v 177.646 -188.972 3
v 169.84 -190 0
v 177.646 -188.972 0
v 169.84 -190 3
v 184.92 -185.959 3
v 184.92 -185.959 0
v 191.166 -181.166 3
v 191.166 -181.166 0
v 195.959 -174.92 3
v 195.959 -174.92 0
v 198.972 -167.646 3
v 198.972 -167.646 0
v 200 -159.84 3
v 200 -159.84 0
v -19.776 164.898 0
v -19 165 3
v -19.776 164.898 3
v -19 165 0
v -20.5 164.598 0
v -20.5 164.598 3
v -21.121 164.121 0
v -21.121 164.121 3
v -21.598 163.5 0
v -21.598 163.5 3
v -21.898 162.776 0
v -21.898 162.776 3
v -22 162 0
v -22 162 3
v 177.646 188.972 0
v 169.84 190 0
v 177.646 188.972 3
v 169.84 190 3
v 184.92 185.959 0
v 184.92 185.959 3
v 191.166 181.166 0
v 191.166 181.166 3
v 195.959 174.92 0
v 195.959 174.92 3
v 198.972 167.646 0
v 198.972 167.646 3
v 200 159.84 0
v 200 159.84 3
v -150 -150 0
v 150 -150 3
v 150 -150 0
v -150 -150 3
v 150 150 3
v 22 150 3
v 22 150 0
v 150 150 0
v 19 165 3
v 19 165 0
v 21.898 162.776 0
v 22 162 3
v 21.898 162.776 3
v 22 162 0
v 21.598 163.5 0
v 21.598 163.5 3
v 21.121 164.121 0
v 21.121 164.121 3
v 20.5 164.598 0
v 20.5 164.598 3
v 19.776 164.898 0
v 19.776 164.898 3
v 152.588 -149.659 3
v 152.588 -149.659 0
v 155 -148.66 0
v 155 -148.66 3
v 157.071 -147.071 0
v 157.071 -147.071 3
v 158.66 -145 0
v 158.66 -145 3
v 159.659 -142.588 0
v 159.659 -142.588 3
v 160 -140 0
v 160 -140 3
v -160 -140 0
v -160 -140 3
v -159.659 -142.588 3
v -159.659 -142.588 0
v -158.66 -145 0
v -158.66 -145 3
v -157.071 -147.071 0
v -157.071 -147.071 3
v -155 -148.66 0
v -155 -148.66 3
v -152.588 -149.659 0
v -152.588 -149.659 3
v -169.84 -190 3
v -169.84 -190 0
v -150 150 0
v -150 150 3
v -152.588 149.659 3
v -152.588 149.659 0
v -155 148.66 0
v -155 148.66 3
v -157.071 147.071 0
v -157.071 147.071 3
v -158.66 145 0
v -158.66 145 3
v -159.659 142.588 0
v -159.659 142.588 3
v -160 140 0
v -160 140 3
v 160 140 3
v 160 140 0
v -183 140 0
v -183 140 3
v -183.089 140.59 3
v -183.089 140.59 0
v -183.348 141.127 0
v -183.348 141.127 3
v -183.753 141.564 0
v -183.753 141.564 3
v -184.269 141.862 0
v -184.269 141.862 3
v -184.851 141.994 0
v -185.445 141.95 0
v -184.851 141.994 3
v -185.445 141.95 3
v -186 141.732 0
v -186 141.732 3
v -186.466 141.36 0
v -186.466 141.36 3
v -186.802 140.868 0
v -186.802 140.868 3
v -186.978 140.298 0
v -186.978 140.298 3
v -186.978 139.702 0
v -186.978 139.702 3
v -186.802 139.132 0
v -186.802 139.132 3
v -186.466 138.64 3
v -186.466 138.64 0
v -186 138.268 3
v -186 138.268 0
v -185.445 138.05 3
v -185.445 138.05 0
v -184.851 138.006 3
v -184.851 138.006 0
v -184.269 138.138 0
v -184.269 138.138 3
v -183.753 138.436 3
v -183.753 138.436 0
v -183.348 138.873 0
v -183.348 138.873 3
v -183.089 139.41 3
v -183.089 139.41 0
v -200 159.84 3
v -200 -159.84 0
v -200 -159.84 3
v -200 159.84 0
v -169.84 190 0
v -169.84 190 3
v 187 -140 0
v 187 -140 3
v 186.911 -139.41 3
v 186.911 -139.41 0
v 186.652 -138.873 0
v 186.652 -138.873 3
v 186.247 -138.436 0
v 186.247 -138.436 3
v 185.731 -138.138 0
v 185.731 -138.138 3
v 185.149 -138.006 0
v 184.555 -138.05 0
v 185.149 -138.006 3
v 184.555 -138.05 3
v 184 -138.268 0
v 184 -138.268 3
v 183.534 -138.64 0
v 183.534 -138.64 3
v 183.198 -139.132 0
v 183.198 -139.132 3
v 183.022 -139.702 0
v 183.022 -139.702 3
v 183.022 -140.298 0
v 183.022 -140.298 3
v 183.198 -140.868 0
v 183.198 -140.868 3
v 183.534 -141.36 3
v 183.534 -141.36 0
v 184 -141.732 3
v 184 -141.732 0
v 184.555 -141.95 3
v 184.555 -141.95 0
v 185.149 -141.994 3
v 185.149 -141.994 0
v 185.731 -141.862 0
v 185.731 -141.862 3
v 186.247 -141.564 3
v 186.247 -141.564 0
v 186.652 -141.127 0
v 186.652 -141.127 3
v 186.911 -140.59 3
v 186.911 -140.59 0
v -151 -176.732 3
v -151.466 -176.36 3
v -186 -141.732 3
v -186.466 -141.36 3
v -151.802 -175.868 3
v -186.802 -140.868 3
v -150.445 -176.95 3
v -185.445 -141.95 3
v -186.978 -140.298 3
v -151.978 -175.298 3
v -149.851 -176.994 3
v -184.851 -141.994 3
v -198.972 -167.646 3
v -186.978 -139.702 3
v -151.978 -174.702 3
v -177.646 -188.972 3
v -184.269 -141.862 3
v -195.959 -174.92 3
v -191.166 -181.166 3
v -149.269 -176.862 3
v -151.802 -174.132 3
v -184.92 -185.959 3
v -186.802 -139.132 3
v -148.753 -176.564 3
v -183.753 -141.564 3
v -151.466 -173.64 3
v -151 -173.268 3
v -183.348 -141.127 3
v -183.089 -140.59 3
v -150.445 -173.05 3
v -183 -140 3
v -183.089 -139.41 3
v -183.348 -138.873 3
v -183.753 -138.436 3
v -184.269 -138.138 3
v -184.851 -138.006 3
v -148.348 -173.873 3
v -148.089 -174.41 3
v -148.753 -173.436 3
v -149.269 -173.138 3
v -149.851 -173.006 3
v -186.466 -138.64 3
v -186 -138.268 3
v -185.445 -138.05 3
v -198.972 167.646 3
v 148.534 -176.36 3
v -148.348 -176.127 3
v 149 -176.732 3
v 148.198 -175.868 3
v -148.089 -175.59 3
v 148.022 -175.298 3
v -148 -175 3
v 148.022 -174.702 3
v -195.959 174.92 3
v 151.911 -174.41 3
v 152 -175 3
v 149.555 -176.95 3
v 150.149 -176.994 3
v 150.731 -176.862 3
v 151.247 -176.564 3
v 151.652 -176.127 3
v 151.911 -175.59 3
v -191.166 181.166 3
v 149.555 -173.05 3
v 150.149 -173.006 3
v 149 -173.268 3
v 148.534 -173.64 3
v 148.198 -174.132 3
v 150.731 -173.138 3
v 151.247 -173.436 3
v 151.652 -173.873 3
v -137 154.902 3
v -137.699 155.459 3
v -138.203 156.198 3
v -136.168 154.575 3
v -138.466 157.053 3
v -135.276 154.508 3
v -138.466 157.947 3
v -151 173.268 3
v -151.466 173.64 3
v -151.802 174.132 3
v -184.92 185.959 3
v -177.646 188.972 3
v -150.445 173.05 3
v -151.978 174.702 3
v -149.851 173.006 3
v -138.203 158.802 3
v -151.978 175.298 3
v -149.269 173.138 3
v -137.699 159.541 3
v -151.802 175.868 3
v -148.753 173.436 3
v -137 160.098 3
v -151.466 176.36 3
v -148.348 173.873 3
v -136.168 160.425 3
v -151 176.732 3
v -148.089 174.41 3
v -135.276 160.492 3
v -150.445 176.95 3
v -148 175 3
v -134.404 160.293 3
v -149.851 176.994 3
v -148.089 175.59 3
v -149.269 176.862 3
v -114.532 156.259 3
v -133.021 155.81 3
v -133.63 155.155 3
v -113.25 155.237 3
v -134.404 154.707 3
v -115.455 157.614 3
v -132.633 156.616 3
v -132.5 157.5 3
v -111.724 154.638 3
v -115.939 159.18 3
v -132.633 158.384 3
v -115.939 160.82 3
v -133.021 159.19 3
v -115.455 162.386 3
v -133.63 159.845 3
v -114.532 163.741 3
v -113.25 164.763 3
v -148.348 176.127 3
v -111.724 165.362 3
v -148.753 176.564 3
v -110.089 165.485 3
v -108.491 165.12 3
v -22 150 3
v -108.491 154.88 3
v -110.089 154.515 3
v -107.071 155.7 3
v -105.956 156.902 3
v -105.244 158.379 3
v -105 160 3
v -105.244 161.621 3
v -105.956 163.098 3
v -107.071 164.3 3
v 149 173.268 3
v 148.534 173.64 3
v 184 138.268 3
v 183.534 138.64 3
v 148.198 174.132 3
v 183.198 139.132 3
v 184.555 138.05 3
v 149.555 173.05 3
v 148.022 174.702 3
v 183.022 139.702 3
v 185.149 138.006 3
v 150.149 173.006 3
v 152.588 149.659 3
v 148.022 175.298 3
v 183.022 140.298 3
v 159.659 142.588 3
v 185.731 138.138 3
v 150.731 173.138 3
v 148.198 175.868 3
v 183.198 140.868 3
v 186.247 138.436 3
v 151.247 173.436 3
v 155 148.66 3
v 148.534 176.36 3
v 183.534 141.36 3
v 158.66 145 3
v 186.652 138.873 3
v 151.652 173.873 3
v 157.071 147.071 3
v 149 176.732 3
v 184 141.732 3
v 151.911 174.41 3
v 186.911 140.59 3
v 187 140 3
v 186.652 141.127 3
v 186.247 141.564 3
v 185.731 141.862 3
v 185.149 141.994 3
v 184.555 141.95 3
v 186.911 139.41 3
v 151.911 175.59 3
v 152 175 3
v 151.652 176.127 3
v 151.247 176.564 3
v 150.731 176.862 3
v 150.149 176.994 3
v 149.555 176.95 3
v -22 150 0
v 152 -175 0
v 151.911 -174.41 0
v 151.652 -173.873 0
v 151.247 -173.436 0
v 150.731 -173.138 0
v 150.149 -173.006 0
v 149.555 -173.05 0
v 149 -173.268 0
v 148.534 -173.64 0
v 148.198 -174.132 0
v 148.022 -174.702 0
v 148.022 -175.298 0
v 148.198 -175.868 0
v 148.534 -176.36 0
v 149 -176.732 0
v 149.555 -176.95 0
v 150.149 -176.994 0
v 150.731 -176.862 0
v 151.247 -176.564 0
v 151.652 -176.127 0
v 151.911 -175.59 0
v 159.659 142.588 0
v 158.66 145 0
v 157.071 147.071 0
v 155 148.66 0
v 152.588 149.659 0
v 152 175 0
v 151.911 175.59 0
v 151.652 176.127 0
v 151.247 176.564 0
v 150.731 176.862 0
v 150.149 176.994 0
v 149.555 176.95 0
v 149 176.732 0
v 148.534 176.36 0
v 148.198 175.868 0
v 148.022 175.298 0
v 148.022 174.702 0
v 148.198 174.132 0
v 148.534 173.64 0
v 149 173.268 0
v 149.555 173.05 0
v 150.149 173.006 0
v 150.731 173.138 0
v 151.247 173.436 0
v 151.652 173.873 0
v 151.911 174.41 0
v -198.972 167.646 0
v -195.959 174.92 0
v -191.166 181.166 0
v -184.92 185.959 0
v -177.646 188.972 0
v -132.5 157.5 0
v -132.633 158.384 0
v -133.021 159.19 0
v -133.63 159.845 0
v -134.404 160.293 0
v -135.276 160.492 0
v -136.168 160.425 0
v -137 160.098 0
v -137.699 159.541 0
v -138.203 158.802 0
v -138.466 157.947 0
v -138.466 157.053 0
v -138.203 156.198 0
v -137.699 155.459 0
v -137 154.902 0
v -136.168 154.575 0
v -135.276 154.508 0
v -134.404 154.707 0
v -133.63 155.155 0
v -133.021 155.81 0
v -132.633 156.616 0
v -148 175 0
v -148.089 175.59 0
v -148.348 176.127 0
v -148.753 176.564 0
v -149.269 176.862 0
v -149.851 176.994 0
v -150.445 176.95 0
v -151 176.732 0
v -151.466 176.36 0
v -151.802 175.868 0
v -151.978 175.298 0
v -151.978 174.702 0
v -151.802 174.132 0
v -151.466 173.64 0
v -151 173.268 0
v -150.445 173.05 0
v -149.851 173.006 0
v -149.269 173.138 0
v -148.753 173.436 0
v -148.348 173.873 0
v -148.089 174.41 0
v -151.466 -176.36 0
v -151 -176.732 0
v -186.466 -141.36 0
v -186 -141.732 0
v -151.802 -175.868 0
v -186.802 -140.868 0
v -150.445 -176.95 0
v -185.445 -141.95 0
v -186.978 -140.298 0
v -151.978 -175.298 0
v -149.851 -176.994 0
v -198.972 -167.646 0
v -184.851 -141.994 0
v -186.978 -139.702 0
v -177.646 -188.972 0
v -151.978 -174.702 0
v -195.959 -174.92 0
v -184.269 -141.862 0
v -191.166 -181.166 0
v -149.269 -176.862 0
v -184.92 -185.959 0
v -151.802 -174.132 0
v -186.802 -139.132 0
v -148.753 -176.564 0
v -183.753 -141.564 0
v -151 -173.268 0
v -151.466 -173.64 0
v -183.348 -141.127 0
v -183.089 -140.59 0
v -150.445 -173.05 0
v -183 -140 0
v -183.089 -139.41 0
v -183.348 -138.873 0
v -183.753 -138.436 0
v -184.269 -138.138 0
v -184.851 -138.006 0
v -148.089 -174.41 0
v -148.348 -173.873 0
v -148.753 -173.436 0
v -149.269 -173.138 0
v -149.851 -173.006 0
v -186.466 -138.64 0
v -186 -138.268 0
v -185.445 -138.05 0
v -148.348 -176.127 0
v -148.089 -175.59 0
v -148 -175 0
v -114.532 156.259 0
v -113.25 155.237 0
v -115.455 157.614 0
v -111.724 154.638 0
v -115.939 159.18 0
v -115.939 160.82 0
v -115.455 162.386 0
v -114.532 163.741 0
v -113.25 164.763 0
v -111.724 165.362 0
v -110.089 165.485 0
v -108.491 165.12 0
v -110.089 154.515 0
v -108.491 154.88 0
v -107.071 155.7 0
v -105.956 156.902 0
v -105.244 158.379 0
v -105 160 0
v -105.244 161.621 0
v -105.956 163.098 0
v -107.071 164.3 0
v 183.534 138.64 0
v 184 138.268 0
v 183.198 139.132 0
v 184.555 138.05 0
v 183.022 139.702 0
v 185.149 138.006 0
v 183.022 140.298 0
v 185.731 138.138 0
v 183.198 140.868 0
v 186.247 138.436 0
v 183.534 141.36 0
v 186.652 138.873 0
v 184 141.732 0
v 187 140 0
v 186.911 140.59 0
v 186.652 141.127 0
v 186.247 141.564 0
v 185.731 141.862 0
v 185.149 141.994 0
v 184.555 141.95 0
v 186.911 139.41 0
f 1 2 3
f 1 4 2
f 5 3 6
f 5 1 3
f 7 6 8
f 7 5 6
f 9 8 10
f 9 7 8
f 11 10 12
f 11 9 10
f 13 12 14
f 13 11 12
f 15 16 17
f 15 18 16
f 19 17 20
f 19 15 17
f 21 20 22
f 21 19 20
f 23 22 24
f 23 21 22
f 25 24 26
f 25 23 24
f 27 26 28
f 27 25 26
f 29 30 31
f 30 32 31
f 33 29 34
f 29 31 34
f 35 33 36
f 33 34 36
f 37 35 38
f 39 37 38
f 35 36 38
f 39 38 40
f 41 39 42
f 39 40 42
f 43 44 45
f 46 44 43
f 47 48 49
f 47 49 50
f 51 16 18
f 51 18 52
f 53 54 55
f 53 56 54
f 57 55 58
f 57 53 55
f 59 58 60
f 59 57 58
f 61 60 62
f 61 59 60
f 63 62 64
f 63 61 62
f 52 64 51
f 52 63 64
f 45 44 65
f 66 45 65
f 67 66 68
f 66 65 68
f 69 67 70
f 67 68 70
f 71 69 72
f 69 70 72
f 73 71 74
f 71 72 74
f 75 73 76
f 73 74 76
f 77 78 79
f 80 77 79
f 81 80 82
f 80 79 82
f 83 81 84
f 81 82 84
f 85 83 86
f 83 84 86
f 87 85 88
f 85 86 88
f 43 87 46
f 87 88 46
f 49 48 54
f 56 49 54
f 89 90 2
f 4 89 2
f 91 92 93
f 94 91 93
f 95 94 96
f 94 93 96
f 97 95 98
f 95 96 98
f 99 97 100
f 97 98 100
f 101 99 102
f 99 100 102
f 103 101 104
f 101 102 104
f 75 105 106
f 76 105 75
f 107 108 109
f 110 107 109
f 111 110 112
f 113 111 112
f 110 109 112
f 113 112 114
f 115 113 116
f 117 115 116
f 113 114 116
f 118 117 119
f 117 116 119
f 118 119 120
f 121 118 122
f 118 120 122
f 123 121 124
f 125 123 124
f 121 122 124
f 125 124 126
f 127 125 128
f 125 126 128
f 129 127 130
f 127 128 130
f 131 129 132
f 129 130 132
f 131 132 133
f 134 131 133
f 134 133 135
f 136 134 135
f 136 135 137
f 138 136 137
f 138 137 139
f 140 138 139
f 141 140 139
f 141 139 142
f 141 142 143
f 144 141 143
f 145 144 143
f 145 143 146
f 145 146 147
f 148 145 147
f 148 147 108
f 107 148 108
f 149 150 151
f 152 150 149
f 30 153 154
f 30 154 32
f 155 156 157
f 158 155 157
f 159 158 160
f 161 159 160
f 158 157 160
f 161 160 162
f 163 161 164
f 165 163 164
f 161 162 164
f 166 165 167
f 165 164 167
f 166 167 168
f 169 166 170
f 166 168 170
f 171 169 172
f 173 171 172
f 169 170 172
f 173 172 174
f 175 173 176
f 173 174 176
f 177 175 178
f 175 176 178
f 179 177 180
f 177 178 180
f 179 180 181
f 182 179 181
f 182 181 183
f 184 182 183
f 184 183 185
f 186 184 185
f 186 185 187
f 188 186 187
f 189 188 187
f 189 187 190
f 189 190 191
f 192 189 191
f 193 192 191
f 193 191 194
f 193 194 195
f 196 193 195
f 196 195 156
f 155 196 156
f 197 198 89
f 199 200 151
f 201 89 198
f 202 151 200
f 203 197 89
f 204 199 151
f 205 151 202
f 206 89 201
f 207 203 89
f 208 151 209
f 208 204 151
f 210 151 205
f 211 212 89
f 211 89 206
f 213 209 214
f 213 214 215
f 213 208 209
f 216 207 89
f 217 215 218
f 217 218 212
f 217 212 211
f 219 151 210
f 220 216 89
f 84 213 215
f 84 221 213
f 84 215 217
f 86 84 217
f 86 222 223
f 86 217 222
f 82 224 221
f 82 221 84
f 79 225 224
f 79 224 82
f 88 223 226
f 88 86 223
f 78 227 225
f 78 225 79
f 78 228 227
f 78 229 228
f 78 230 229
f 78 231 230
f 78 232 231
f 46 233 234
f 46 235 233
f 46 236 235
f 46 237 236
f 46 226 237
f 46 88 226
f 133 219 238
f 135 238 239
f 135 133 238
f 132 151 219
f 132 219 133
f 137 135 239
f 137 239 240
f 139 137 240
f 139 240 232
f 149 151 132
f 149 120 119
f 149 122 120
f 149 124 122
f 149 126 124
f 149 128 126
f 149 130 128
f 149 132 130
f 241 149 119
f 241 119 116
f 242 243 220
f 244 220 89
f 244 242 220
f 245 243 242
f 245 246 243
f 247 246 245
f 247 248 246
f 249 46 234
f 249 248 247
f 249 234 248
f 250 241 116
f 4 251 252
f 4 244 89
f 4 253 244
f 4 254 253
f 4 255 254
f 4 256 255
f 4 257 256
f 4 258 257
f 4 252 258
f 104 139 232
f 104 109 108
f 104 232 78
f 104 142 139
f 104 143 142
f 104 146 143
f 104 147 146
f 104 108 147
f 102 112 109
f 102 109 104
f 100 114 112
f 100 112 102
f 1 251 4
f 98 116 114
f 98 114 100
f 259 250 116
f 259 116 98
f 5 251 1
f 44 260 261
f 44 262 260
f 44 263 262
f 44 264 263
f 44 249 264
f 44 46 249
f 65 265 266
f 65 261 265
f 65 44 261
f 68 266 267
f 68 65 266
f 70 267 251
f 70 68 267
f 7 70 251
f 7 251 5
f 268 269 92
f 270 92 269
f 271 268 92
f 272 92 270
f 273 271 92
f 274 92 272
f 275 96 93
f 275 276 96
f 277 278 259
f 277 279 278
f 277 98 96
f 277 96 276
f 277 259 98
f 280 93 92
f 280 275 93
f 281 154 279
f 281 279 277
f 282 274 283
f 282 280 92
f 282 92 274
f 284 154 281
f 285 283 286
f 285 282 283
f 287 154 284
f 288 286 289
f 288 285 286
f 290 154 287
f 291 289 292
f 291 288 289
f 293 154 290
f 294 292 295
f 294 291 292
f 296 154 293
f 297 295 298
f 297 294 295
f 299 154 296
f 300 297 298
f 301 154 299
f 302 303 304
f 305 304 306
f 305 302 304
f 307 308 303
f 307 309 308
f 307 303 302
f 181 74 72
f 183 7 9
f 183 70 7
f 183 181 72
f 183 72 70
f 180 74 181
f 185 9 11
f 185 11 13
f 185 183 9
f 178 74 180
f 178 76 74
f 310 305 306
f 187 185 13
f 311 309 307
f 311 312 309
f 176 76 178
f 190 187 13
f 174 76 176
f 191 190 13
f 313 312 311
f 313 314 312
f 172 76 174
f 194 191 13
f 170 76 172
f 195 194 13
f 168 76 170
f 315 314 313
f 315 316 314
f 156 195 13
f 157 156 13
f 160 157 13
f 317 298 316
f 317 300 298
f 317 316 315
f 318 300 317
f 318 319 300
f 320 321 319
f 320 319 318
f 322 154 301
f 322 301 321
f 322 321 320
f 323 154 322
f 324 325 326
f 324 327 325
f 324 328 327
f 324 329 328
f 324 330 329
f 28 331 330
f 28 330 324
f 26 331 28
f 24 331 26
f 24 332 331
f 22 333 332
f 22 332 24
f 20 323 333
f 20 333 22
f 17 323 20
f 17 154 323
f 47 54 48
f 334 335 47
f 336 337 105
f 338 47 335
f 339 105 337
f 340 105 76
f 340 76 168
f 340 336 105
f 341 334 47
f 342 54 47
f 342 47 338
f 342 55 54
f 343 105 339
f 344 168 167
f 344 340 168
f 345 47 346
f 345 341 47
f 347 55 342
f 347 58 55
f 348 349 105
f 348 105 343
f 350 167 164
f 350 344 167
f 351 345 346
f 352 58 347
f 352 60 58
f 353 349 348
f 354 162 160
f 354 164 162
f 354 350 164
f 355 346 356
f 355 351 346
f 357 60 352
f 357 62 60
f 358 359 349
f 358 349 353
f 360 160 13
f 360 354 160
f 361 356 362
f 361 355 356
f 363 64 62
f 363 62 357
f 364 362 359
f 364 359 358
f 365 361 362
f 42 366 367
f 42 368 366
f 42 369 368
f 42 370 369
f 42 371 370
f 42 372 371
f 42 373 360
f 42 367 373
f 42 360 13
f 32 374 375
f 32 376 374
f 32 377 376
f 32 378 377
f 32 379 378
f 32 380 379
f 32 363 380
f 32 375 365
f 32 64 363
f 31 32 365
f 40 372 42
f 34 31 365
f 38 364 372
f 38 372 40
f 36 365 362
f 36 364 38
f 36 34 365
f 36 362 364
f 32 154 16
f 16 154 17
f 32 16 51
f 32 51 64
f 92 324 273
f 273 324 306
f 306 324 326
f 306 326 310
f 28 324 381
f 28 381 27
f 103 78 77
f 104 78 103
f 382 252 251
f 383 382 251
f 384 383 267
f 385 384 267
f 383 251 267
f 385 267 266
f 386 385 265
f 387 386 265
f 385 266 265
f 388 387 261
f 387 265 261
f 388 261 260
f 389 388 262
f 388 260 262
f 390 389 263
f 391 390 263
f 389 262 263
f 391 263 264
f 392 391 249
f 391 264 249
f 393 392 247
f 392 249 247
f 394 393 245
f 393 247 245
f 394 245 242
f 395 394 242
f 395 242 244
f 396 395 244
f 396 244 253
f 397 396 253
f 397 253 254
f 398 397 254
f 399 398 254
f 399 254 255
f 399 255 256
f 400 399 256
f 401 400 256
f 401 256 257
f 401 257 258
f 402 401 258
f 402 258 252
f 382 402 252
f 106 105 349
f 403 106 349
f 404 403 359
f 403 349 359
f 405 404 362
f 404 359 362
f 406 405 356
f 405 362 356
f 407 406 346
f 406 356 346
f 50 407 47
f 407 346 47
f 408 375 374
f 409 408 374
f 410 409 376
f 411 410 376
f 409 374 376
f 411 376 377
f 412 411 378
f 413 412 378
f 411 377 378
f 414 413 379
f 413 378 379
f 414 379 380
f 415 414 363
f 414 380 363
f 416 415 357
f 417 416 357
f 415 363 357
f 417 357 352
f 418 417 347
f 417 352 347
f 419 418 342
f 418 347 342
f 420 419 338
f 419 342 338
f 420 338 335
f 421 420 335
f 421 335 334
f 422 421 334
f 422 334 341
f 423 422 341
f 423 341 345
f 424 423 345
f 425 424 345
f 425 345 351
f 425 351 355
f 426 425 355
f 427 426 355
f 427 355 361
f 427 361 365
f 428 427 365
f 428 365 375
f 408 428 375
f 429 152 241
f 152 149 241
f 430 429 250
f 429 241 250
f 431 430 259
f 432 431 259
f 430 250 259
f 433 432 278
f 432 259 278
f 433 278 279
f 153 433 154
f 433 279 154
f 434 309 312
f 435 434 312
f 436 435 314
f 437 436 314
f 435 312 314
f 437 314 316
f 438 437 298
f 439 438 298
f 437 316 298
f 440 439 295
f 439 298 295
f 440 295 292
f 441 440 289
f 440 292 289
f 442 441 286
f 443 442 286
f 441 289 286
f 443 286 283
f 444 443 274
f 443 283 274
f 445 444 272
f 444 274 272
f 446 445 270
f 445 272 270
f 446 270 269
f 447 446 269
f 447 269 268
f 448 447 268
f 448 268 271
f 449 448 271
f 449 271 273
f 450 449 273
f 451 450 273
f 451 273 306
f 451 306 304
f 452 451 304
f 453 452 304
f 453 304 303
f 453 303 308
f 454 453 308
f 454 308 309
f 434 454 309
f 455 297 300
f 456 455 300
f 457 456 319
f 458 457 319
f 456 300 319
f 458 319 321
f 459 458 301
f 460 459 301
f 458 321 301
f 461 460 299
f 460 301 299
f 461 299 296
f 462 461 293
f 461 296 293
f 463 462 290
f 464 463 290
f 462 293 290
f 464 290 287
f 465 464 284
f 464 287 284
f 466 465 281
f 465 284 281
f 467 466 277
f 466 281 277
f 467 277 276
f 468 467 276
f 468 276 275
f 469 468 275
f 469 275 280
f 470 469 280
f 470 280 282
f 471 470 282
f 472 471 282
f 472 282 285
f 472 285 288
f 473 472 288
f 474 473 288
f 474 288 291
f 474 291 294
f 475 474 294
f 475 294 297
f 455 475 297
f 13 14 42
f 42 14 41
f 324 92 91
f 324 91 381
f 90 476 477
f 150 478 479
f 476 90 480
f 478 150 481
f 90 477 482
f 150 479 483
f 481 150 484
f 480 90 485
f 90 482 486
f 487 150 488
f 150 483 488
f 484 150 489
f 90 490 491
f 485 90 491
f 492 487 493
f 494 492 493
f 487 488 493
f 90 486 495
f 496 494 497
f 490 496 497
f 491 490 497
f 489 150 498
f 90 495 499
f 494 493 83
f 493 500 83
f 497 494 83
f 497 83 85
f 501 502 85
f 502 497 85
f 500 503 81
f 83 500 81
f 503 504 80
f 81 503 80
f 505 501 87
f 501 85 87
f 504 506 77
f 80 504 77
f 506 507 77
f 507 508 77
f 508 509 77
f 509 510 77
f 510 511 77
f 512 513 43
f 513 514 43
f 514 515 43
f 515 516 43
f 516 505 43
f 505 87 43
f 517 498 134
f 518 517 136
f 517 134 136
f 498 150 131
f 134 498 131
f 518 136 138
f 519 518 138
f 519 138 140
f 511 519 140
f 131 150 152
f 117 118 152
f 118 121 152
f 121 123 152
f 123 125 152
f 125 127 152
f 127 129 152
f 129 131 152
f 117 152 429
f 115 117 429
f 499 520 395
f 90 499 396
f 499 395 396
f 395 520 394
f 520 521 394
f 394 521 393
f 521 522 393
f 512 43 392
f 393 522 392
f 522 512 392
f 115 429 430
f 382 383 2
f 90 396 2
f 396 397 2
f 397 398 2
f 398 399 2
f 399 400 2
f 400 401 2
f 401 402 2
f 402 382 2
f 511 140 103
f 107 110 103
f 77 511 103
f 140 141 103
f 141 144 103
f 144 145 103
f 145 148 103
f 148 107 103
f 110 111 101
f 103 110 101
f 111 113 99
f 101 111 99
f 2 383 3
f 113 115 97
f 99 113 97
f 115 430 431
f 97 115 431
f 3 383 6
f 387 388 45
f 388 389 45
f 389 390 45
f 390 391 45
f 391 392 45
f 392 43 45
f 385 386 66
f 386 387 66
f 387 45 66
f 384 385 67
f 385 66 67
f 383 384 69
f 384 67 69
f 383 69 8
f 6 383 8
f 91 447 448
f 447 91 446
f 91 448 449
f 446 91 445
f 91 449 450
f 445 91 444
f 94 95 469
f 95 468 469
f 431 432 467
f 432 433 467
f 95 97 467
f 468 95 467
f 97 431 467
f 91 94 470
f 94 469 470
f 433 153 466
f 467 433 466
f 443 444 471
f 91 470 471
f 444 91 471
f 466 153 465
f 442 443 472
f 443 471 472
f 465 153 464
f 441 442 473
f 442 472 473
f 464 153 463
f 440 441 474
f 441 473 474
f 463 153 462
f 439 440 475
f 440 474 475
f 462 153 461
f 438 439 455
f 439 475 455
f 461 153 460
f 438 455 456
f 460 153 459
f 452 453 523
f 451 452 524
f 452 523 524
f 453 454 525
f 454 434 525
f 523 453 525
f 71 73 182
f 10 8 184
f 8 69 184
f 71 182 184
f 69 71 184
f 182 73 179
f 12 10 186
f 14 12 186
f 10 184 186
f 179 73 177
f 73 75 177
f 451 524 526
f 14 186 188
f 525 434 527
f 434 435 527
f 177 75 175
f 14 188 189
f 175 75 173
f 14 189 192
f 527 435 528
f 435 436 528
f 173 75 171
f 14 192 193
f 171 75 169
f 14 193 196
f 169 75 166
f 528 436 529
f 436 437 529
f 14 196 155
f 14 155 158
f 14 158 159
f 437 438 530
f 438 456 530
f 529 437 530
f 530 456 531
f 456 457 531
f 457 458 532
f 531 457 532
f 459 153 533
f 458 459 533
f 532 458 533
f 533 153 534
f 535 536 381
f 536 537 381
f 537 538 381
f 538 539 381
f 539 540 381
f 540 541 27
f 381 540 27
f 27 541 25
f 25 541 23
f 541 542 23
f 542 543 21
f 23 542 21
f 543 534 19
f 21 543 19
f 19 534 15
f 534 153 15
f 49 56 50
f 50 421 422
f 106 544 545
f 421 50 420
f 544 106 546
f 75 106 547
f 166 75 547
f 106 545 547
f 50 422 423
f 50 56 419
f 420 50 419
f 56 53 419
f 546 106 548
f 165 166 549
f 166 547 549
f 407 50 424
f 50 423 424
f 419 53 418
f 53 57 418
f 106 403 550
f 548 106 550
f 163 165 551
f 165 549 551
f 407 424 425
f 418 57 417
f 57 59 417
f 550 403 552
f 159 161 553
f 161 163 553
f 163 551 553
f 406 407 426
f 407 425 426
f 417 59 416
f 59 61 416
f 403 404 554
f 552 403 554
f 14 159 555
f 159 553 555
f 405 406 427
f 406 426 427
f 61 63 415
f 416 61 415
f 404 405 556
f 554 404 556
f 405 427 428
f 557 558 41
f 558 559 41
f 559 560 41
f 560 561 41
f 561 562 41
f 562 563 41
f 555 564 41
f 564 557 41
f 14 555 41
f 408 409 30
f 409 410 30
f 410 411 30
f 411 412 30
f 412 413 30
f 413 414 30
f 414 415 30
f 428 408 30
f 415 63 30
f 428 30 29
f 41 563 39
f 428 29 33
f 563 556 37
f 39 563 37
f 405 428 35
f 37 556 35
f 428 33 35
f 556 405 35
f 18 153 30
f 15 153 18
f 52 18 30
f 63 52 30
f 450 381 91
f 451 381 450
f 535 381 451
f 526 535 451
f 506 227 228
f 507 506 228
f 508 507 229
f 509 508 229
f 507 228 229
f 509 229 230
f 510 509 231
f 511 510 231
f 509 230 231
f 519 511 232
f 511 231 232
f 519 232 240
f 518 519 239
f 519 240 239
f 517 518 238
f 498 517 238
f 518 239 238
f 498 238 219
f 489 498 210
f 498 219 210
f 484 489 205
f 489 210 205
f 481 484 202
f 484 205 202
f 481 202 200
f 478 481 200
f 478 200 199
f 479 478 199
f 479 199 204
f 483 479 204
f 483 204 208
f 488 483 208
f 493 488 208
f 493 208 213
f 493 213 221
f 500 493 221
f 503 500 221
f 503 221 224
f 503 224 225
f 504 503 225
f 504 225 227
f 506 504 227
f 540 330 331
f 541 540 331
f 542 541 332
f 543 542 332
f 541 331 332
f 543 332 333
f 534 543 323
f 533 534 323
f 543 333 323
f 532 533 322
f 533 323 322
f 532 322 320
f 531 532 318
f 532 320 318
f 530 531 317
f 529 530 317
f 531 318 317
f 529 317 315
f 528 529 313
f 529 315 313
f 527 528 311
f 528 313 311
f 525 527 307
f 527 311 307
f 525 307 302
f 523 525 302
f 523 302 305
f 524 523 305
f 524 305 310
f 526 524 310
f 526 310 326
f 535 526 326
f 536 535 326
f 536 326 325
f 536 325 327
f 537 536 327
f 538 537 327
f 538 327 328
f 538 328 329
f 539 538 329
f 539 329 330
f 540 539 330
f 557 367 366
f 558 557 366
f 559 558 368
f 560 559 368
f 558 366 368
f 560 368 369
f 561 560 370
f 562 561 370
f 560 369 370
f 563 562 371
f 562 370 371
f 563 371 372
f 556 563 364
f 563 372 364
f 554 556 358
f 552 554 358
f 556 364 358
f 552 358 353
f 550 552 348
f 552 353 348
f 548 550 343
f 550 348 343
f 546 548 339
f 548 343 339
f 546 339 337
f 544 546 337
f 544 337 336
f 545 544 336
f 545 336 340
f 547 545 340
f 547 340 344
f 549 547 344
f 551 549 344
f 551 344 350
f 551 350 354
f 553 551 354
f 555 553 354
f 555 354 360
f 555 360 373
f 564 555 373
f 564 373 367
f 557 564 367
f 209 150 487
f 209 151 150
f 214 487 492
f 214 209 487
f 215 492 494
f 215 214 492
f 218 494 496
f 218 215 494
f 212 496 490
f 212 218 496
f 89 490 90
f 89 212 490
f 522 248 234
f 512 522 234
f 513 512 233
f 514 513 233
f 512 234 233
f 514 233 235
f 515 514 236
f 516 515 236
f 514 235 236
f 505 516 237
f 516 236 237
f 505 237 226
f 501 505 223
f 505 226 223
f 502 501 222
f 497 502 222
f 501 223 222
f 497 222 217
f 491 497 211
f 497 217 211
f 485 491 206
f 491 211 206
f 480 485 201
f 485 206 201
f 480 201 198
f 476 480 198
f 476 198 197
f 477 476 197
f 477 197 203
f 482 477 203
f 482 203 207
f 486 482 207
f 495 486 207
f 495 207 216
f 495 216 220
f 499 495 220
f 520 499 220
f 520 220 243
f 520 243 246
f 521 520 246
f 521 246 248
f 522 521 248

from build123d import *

# Parameters (mm, degrees)
SKETCH_W        = 400
SKETCH_H        = 380
PAD_DEPTH       = 3
SKETCH001_R     = 2
POCKET_DEPTH    = 3.001
POCKET001_DEPTH = 3.001
SKETCH003_R     = 3
SKETCH003_R_2   = 5.5
POCKET002_DEPTH = 3.001
FILLET_R        = 30.16
SKETCH004_W     = 44
SKETCH004_H     = 44
POCKET003_DEPTH = 3.001
FILLET001_R     = 3


with BuildPart() as part:
    # Sketch → Pad (new body)
    with BuildSketch(Plane.XY):
        Rectangle(SKETCH_W, SKETCH_H)
    extrude(amount=PAD_DEPTH)

    # Sketch001 (on Face6 of Pad) → Pocket (cut, through all)
    with BuildSketch(Plane.XY.offset(3)):
        with Locations((-150, 175)):
            Circle(SKETCH001_R)
        with Locations((-185, 140)):
            Circle(SKETCH001_R)
        with Locations((-185, -140)):
            Circle(SKETCH001_R)
        with Locations((-150, -175)):
            Circle(SKETCH001_R)
        with Locations((150, -175)):
            Circle(SKETCH001_R)
        with Locations((185, -140)):
            Circle(SKETCH001_R)
        with Locations((185, 140)):
            Circle(SKETCH001_R)
        with Locations((150, 175)):
            Circle(SKETCH001_R)
    extrude(amount=-POCKET_DEPTH, mode=Mode.SUBTRACT)

    # Sketch002 (on Face5 of Pocket) → Pocket001 (cut, through all)
    with BuildSketch(Plane.XY.offset(3)):
        with BuildLine():
            Line((-150, 150), (150, 150))
            ThreePointArc((160, 140), (157.071068, 147.071068), (150, 150))
            Line((160, 140), (160, -140))
            ThreePointArc((150, -150), (157.071068, -147.071068), (160, -140))
            Line((150, -150), (-150, -150))
            ThreePointArc((-160, -140), (-157.071068, -147.071068), (-150, -150))
            Line((-160, -140), (-160, 140))
            ThreePointArc((-150, 150), (-157.071068, 147.071068), (-160, 140))
        make_face()
    extrude(amount=-POCKET001_DEPTH, mode=Mode.SUBTRACT)

    # Sketch003 (on Face5 of Pocket001) → Pocket002 (cut, through all)
    with BuildSketch(Plane.XY.offset(3)):
        with Locations((-135.5, 157.5)):
            Circle(SKETCH003_R)
        with Locations((-110.5, 160)):
            Circle(SKETCH003_R_2)
    extrude(amount=-POCKET002_DEPTH, mode=Mode.SUBTRACT)

    # Fillet
    fillet_edges = [part.edges().sort_by_distance(p)[0] for p in [
        (-200, -190, 1.5),
        (-200, 190, 1.5),
        (200, 190, 1.5),
        (200, -190, 1.5),
    ]]
    fillet(fillet_edges, radius=FILLET_R)

    # Sketch004 (on Face5 of Fillet) → Pocket003 (cut, through all)
    with BuildSketch(Plane.XY.offset(3)):
        with Locations((0, 143)):
            Rectangle(SKETCH004_W, SKETCH004_H)
    extrude(amount=-POCKET003_DEPTH, mode=Mode.SUBTRACT)

    # Fillet001
    fillet001_edges = [part.edges().sort_by_distance(p)[0] for p in [
        (-22, 165, 1.5),
        (22, 165, 1.5),
    ]]
    fillet(fillet001_edges, radius=FILLET001_R)


solid = part.part
